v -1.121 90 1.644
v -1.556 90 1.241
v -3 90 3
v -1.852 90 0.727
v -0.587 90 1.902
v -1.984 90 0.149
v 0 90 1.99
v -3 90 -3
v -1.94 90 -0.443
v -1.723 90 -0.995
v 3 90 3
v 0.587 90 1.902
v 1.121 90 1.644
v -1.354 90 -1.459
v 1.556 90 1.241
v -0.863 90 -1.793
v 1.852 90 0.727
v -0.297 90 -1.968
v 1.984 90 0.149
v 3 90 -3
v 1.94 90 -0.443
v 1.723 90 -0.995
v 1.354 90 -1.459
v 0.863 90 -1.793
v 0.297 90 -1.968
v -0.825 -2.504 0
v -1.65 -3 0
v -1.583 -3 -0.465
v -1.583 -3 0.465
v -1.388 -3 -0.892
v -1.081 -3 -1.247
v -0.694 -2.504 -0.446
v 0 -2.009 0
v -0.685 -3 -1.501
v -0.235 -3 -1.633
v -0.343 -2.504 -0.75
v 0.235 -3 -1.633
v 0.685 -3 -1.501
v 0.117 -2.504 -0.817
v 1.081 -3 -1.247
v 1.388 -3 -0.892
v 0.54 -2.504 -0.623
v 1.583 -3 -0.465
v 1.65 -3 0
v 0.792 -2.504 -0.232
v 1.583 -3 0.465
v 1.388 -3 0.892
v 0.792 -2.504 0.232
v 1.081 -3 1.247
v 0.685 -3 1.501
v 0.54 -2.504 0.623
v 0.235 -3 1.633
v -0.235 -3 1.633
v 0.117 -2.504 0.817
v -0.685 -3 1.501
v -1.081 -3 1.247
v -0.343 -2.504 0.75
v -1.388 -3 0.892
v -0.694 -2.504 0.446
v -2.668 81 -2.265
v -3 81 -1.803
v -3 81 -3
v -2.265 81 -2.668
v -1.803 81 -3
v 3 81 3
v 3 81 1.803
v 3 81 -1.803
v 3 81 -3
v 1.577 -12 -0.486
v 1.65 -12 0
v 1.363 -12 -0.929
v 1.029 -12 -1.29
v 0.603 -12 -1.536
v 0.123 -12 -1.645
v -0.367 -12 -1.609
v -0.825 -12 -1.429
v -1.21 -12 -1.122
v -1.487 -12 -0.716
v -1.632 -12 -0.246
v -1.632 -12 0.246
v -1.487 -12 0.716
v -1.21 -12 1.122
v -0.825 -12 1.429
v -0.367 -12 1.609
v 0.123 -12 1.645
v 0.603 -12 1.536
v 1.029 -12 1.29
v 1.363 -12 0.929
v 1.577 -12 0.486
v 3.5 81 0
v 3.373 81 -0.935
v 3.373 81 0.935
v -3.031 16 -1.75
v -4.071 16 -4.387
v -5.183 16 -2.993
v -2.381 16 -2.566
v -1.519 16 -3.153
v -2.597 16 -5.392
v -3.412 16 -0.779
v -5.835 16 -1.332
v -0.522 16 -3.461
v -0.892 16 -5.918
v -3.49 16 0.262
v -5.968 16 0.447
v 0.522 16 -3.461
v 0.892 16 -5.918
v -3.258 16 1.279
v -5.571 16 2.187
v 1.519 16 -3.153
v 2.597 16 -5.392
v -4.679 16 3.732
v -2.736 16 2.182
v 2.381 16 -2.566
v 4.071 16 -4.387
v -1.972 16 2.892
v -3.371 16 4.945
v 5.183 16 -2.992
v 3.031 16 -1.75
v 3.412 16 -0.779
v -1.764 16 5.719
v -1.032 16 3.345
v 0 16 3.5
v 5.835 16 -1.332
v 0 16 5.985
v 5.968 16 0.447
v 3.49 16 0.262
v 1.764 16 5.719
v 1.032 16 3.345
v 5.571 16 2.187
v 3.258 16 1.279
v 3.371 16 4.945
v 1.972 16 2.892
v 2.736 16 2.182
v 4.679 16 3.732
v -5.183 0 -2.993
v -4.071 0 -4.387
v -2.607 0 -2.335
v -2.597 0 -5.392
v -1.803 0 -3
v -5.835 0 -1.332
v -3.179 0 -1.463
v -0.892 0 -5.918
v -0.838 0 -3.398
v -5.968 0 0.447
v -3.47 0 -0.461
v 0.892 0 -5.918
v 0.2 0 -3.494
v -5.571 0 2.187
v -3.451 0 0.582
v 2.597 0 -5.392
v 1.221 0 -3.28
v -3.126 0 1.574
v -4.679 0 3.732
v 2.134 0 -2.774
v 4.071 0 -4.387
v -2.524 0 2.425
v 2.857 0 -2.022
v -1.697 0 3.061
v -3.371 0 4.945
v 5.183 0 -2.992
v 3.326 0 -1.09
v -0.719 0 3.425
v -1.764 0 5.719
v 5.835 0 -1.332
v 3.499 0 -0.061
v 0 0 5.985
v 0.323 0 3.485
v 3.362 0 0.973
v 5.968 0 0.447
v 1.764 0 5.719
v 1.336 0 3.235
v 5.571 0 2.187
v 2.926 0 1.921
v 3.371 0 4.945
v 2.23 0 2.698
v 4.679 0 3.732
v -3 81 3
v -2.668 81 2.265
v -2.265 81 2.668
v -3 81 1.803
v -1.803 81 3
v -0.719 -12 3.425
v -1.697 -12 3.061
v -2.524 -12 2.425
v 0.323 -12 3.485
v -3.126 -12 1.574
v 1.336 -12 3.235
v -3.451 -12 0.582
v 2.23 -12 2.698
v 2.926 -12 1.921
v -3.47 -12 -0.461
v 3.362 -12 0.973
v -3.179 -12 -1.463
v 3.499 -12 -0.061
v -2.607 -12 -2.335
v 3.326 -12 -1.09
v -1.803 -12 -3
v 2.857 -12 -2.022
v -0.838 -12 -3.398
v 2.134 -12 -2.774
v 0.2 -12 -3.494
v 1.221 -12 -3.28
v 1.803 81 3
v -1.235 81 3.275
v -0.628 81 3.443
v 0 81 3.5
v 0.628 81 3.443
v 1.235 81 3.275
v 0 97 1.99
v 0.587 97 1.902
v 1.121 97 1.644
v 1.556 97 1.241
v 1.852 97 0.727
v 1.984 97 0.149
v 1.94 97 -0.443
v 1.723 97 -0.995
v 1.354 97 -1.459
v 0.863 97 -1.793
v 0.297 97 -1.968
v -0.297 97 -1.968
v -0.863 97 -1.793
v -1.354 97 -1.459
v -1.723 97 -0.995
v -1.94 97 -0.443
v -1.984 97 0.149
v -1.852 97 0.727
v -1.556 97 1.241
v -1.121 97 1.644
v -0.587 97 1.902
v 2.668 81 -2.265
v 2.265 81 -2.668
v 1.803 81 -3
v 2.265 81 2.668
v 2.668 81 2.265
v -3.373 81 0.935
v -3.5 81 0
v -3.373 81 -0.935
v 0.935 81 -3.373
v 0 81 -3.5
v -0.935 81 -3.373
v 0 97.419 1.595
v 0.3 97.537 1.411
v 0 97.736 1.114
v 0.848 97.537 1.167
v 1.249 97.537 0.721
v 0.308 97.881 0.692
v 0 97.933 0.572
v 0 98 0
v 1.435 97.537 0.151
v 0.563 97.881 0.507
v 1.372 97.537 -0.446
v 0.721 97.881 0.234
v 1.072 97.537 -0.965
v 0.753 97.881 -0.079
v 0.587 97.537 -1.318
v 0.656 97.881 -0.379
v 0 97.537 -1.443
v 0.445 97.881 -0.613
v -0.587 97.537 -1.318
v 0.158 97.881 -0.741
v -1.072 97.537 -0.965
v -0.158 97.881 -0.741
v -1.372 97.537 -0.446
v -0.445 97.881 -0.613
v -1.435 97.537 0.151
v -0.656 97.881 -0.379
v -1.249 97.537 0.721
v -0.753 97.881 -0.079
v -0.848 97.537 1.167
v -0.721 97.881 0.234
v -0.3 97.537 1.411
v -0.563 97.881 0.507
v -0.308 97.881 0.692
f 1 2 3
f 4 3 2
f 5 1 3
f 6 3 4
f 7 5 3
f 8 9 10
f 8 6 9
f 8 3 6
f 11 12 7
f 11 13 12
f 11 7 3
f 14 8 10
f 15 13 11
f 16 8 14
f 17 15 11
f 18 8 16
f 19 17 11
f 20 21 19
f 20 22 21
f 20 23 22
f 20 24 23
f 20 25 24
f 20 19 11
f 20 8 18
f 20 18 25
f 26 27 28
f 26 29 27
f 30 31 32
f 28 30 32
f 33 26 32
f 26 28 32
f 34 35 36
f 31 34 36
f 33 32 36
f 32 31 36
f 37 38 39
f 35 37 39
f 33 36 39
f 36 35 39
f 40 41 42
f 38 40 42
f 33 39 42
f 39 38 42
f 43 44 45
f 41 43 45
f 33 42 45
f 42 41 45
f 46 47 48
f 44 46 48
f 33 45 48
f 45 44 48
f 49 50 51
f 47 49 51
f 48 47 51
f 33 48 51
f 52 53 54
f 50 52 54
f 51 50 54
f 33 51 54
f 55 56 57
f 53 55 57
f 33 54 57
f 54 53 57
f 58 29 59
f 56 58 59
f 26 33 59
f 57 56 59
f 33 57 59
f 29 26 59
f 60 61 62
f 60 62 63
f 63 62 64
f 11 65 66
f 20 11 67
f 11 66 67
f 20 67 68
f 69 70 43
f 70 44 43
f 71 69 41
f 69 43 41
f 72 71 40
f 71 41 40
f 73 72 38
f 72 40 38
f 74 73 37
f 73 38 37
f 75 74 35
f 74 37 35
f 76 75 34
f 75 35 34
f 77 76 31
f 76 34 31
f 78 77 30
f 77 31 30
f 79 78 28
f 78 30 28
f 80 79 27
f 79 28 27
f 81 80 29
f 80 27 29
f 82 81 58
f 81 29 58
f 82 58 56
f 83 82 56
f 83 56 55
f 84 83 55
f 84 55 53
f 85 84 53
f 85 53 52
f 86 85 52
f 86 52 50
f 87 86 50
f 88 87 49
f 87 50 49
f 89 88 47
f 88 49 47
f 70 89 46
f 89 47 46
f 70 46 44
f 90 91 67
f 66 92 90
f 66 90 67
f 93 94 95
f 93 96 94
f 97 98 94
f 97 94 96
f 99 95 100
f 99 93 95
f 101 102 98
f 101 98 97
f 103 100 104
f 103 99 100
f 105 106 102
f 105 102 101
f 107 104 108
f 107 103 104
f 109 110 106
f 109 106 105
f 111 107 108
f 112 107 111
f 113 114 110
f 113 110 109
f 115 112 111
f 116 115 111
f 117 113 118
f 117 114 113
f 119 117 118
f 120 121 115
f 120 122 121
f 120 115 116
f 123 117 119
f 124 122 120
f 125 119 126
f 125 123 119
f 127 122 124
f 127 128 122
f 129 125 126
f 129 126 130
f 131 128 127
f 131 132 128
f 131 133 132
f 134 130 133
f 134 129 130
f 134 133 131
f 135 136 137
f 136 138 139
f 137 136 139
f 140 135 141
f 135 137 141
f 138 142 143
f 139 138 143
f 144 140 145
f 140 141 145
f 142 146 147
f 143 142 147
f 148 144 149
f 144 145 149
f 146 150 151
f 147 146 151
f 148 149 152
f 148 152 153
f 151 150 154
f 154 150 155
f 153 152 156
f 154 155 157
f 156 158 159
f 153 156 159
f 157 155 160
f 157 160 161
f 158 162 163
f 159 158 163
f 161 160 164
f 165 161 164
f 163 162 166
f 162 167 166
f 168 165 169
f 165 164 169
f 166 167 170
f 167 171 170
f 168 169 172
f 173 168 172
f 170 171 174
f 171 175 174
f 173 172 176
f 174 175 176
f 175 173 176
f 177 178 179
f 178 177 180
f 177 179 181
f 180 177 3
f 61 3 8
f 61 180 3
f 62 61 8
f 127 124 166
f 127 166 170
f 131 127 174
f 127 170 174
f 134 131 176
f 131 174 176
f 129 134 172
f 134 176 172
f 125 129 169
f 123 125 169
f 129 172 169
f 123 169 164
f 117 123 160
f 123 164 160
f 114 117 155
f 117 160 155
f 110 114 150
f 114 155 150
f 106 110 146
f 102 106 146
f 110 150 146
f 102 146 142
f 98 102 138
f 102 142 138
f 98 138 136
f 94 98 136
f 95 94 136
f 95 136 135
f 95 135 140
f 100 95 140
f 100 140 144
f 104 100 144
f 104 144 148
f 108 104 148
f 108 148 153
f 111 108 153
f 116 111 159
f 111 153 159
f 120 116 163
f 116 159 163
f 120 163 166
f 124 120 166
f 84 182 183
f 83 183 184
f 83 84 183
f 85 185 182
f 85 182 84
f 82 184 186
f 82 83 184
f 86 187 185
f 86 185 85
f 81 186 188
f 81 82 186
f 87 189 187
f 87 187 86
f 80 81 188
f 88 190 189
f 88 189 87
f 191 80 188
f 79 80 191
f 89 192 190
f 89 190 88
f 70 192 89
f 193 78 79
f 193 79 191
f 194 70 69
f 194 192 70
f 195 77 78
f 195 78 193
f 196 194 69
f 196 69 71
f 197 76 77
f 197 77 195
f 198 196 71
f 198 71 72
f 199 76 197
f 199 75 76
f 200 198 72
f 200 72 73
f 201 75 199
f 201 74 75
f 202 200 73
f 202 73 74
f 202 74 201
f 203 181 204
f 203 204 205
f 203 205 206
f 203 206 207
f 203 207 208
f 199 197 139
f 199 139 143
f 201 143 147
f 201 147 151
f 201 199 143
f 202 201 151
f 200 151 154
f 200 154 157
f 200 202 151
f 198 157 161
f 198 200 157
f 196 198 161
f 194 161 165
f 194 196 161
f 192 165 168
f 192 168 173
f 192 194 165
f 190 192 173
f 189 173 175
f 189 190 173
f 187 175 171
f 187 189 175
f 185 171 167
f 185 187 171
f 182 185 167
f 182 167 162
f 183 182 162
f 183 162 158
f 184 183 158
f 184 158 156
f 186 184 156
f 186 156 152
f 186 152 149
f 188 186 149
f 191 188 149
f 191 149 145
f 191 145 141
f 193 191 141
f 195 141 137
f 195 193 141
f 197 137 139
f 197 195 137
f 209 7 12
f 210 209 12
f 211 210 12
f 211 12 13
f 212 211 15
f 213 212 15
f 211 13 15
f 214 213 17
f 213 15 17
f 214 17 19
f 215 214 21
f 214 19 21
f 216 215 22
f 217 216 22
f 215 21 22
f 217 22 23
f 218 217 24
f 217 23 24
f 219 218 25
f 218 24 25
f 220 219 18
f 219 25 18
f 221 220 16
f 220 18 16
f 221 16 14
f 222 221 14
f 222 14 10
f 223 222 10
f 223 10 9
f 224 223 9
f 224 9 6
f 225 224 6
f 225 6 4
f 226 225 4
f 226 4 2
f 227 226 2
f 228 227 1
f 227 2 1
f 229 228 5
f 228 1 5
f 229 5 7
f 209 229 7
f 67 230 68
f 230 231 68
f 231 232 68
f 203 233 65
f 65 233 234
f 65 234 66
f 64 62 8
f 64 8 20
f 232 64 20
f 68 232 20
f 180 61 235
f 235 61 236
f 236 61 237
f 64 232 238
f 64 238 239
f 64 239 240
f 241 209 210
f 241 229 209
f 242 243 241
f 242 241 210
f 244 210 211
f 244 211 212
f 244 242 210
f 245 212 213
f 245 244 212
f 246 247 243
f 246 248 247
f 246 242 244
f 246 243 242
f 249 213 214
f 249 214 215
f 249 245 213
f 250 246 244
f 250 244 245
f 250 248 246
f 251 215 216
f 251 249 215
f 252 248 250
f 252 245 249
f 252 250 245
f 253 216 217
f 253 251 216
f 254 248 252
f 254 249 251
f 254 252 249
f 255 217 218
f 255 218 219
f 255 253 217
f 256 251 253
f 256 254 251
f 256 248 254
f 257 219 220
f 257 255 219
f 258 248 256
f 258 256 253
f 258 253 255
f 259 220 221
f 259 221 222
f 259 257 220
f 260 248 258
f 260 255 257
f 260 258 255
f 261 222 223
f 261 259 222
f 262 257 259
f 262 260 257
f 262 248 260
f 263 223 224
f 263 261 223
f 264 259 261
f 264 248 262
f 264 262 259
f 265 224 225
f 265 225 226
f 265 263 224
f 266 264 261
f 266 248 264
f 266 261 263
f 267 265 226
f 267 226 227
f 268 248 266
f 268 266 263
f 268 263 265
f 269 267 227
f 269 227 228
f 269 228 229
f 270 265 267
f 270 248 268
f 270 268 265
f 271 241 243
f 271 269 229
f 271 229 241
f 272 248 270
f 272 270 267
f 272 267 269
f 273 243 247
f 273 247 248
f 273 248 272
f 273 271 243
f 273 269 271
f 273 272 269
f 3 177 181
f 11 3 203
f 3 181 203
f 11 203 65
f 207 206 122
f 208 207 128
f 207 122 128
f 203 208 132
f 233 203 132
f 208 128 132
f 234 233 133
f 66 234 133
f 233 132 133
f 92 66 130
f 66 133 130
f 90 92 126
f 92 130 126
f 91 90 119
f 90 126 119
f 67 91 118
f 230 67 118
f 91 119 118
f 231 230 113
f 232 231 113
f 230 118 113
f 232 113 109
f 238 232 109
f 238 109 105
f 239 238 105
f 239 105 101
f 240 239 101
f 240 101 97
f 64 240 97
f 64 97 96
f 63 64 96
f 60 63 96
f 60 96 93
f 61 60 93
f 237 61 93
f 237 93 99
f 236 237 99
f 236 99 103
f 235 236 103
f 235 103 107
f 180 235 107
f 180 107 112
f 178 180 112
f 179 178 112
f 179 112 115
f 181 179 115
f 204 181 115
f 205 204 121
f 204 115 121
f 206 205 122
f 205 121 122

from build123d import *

# Parameters (mm, degrees)
SKETCH1_R                   = 5.985
BOSS_EXTRUDE1_DEPTH         = 16
SKETCH2_R                   = 3.5
BOSS_EXTRUDE2_DEPTH         = 65
SKETCH3_W                   = 6
SKETCH3_H                   = 6
BOSS_EXTRUDE3_DEPTH         = 9
SKETCH4_R                   = 1.99
BOSS_EXTRUDE4_DEPTH         = 7
BOSS_EXTRUDE5_START         = 12
SKETCH5_R                   = 3.5
BOSS_EXTRUDE5_DEPTH         = 12
TAP_DRILL_FOR_M4_TAP1_D     = 3.3
TAP_DRILL_FOR_M4_TAP1_DEPTH = 9
TAP_DRILL_FOR_M4_TAP1_TIP   = 0.991420021
DOME1_FACE_RADIUS           = 1.99
DOME1_HEIGHT                = 1


with BuildPart() as part:
    # Sketch1 → Boss-Extrude1 (new body)
    with BuildSketch(Plane(origin=(0, 0, 0), x_dir=(1, 0, 0), z_dir=(0, 1, 0))):
        with Locations(Location((0, 0, 0), (0, 0, 270))):
            Circle(SKETCH1_R)
    extrude(amount=BOSS_EXTRUDE1_DEPTH)

    # Sketch2 → Boss-Extrude2 (add)
    with BuildSketch(Plane(origin=(0, 16, 0), x_dir=(1, 0, 0), z_dir=(0, 1, 0))):
        with Locations(Location((0, 0, 0), (0, 0, 270))):
            Circle(SKETCH2_R)
    extrude(amount=BOSS_EXTRUDE2_DEPTH)

    # Sketch3 → Boss-Extrude3 (add)
    with BuildSketch(Plane(origin=(0, 81, 0), x_dir=(1, 0, 0), z_dir=(0, 1, 0))):
        Rectangle(SKETCH3_W, SKETCH3_H)
    extrude(amount=BOSS_EXTRUDE3_DEPTH)

    # Sketch4 → Boss-Extrude4 (add)
    with BuildSketch(Plane(origin=(0, 90, 0), x_dir=(1, 0, 0), z_dir=(0, 1, 0))):
        with Locations(Location((0, 0, 0), (0, 0, 270))):
            Circle(SKETCH4_R)
    extrude(amount=BOSS_EXTRUDE4_DEPTH)

    # Sketch5 → Boss-Extrude5 (add)
    with BuildSketch(Plane.XZ.offset(BOSS_EXTRUDE5_START)):
        with Locations(Location((0, 0, 0), (0, 0, 238.997280866))):
            Circle(SKETCH5_R)
    extrude(amount=-BOSS_EXTRUDE5_DEPTH)

    # Tap Drill for M4 Tap1
    with Locations(Plane(origin=(0, -12, 0), x_dir=(-1, 0, 0), z_dir=(0, -1, 0))):
        with Locations((0, 0)):
            Hole(TAP_DRILL_FOR_M4_TAP1_D / 2, depth=TAP_DRILL_FOR_M4_TAP1_DEPTH)
            with Locations((0, 0, -(TAP_DRILL_FOR_M4_TAP1_DEPTH + TAP_DRILL_FOR_M4_TAP1_TIP / 2))):  # 118° drill point
                Cone(0, TAP_DRILL_FOR_M4_TAP1_D / 2, TAP_DRILL_FOR_M4_TAP1_TIP, mode=Mode.SUBTRACT)

    # Dome1: a dome of height H over a round flat face of radius A is a cap of a sphere of radius (A * A + H * H) / (2 * H)
    dome1_r = (DOME1_FACE_RADIUS * DOME1_FACE_RADIUS + DOME1_HEIGHT * DOME1_HEIGHT) / (2 * DOME1_HEIGHT)
    dome1_base = Plane((0, 97, 0), z_dir=(0, 1, 0))
    with Locations(dome1_base.offset(DOME1_HEIGHT - dome1_r)):
        dome1_ball = Sphere(dome1_r, mode=Mode.PRIVATE)
    add(split(dome1_ball, bisect_by=dome1_base, keep=Keep.TOP, mode=Mode.PRIVATE))


solid = part.part
